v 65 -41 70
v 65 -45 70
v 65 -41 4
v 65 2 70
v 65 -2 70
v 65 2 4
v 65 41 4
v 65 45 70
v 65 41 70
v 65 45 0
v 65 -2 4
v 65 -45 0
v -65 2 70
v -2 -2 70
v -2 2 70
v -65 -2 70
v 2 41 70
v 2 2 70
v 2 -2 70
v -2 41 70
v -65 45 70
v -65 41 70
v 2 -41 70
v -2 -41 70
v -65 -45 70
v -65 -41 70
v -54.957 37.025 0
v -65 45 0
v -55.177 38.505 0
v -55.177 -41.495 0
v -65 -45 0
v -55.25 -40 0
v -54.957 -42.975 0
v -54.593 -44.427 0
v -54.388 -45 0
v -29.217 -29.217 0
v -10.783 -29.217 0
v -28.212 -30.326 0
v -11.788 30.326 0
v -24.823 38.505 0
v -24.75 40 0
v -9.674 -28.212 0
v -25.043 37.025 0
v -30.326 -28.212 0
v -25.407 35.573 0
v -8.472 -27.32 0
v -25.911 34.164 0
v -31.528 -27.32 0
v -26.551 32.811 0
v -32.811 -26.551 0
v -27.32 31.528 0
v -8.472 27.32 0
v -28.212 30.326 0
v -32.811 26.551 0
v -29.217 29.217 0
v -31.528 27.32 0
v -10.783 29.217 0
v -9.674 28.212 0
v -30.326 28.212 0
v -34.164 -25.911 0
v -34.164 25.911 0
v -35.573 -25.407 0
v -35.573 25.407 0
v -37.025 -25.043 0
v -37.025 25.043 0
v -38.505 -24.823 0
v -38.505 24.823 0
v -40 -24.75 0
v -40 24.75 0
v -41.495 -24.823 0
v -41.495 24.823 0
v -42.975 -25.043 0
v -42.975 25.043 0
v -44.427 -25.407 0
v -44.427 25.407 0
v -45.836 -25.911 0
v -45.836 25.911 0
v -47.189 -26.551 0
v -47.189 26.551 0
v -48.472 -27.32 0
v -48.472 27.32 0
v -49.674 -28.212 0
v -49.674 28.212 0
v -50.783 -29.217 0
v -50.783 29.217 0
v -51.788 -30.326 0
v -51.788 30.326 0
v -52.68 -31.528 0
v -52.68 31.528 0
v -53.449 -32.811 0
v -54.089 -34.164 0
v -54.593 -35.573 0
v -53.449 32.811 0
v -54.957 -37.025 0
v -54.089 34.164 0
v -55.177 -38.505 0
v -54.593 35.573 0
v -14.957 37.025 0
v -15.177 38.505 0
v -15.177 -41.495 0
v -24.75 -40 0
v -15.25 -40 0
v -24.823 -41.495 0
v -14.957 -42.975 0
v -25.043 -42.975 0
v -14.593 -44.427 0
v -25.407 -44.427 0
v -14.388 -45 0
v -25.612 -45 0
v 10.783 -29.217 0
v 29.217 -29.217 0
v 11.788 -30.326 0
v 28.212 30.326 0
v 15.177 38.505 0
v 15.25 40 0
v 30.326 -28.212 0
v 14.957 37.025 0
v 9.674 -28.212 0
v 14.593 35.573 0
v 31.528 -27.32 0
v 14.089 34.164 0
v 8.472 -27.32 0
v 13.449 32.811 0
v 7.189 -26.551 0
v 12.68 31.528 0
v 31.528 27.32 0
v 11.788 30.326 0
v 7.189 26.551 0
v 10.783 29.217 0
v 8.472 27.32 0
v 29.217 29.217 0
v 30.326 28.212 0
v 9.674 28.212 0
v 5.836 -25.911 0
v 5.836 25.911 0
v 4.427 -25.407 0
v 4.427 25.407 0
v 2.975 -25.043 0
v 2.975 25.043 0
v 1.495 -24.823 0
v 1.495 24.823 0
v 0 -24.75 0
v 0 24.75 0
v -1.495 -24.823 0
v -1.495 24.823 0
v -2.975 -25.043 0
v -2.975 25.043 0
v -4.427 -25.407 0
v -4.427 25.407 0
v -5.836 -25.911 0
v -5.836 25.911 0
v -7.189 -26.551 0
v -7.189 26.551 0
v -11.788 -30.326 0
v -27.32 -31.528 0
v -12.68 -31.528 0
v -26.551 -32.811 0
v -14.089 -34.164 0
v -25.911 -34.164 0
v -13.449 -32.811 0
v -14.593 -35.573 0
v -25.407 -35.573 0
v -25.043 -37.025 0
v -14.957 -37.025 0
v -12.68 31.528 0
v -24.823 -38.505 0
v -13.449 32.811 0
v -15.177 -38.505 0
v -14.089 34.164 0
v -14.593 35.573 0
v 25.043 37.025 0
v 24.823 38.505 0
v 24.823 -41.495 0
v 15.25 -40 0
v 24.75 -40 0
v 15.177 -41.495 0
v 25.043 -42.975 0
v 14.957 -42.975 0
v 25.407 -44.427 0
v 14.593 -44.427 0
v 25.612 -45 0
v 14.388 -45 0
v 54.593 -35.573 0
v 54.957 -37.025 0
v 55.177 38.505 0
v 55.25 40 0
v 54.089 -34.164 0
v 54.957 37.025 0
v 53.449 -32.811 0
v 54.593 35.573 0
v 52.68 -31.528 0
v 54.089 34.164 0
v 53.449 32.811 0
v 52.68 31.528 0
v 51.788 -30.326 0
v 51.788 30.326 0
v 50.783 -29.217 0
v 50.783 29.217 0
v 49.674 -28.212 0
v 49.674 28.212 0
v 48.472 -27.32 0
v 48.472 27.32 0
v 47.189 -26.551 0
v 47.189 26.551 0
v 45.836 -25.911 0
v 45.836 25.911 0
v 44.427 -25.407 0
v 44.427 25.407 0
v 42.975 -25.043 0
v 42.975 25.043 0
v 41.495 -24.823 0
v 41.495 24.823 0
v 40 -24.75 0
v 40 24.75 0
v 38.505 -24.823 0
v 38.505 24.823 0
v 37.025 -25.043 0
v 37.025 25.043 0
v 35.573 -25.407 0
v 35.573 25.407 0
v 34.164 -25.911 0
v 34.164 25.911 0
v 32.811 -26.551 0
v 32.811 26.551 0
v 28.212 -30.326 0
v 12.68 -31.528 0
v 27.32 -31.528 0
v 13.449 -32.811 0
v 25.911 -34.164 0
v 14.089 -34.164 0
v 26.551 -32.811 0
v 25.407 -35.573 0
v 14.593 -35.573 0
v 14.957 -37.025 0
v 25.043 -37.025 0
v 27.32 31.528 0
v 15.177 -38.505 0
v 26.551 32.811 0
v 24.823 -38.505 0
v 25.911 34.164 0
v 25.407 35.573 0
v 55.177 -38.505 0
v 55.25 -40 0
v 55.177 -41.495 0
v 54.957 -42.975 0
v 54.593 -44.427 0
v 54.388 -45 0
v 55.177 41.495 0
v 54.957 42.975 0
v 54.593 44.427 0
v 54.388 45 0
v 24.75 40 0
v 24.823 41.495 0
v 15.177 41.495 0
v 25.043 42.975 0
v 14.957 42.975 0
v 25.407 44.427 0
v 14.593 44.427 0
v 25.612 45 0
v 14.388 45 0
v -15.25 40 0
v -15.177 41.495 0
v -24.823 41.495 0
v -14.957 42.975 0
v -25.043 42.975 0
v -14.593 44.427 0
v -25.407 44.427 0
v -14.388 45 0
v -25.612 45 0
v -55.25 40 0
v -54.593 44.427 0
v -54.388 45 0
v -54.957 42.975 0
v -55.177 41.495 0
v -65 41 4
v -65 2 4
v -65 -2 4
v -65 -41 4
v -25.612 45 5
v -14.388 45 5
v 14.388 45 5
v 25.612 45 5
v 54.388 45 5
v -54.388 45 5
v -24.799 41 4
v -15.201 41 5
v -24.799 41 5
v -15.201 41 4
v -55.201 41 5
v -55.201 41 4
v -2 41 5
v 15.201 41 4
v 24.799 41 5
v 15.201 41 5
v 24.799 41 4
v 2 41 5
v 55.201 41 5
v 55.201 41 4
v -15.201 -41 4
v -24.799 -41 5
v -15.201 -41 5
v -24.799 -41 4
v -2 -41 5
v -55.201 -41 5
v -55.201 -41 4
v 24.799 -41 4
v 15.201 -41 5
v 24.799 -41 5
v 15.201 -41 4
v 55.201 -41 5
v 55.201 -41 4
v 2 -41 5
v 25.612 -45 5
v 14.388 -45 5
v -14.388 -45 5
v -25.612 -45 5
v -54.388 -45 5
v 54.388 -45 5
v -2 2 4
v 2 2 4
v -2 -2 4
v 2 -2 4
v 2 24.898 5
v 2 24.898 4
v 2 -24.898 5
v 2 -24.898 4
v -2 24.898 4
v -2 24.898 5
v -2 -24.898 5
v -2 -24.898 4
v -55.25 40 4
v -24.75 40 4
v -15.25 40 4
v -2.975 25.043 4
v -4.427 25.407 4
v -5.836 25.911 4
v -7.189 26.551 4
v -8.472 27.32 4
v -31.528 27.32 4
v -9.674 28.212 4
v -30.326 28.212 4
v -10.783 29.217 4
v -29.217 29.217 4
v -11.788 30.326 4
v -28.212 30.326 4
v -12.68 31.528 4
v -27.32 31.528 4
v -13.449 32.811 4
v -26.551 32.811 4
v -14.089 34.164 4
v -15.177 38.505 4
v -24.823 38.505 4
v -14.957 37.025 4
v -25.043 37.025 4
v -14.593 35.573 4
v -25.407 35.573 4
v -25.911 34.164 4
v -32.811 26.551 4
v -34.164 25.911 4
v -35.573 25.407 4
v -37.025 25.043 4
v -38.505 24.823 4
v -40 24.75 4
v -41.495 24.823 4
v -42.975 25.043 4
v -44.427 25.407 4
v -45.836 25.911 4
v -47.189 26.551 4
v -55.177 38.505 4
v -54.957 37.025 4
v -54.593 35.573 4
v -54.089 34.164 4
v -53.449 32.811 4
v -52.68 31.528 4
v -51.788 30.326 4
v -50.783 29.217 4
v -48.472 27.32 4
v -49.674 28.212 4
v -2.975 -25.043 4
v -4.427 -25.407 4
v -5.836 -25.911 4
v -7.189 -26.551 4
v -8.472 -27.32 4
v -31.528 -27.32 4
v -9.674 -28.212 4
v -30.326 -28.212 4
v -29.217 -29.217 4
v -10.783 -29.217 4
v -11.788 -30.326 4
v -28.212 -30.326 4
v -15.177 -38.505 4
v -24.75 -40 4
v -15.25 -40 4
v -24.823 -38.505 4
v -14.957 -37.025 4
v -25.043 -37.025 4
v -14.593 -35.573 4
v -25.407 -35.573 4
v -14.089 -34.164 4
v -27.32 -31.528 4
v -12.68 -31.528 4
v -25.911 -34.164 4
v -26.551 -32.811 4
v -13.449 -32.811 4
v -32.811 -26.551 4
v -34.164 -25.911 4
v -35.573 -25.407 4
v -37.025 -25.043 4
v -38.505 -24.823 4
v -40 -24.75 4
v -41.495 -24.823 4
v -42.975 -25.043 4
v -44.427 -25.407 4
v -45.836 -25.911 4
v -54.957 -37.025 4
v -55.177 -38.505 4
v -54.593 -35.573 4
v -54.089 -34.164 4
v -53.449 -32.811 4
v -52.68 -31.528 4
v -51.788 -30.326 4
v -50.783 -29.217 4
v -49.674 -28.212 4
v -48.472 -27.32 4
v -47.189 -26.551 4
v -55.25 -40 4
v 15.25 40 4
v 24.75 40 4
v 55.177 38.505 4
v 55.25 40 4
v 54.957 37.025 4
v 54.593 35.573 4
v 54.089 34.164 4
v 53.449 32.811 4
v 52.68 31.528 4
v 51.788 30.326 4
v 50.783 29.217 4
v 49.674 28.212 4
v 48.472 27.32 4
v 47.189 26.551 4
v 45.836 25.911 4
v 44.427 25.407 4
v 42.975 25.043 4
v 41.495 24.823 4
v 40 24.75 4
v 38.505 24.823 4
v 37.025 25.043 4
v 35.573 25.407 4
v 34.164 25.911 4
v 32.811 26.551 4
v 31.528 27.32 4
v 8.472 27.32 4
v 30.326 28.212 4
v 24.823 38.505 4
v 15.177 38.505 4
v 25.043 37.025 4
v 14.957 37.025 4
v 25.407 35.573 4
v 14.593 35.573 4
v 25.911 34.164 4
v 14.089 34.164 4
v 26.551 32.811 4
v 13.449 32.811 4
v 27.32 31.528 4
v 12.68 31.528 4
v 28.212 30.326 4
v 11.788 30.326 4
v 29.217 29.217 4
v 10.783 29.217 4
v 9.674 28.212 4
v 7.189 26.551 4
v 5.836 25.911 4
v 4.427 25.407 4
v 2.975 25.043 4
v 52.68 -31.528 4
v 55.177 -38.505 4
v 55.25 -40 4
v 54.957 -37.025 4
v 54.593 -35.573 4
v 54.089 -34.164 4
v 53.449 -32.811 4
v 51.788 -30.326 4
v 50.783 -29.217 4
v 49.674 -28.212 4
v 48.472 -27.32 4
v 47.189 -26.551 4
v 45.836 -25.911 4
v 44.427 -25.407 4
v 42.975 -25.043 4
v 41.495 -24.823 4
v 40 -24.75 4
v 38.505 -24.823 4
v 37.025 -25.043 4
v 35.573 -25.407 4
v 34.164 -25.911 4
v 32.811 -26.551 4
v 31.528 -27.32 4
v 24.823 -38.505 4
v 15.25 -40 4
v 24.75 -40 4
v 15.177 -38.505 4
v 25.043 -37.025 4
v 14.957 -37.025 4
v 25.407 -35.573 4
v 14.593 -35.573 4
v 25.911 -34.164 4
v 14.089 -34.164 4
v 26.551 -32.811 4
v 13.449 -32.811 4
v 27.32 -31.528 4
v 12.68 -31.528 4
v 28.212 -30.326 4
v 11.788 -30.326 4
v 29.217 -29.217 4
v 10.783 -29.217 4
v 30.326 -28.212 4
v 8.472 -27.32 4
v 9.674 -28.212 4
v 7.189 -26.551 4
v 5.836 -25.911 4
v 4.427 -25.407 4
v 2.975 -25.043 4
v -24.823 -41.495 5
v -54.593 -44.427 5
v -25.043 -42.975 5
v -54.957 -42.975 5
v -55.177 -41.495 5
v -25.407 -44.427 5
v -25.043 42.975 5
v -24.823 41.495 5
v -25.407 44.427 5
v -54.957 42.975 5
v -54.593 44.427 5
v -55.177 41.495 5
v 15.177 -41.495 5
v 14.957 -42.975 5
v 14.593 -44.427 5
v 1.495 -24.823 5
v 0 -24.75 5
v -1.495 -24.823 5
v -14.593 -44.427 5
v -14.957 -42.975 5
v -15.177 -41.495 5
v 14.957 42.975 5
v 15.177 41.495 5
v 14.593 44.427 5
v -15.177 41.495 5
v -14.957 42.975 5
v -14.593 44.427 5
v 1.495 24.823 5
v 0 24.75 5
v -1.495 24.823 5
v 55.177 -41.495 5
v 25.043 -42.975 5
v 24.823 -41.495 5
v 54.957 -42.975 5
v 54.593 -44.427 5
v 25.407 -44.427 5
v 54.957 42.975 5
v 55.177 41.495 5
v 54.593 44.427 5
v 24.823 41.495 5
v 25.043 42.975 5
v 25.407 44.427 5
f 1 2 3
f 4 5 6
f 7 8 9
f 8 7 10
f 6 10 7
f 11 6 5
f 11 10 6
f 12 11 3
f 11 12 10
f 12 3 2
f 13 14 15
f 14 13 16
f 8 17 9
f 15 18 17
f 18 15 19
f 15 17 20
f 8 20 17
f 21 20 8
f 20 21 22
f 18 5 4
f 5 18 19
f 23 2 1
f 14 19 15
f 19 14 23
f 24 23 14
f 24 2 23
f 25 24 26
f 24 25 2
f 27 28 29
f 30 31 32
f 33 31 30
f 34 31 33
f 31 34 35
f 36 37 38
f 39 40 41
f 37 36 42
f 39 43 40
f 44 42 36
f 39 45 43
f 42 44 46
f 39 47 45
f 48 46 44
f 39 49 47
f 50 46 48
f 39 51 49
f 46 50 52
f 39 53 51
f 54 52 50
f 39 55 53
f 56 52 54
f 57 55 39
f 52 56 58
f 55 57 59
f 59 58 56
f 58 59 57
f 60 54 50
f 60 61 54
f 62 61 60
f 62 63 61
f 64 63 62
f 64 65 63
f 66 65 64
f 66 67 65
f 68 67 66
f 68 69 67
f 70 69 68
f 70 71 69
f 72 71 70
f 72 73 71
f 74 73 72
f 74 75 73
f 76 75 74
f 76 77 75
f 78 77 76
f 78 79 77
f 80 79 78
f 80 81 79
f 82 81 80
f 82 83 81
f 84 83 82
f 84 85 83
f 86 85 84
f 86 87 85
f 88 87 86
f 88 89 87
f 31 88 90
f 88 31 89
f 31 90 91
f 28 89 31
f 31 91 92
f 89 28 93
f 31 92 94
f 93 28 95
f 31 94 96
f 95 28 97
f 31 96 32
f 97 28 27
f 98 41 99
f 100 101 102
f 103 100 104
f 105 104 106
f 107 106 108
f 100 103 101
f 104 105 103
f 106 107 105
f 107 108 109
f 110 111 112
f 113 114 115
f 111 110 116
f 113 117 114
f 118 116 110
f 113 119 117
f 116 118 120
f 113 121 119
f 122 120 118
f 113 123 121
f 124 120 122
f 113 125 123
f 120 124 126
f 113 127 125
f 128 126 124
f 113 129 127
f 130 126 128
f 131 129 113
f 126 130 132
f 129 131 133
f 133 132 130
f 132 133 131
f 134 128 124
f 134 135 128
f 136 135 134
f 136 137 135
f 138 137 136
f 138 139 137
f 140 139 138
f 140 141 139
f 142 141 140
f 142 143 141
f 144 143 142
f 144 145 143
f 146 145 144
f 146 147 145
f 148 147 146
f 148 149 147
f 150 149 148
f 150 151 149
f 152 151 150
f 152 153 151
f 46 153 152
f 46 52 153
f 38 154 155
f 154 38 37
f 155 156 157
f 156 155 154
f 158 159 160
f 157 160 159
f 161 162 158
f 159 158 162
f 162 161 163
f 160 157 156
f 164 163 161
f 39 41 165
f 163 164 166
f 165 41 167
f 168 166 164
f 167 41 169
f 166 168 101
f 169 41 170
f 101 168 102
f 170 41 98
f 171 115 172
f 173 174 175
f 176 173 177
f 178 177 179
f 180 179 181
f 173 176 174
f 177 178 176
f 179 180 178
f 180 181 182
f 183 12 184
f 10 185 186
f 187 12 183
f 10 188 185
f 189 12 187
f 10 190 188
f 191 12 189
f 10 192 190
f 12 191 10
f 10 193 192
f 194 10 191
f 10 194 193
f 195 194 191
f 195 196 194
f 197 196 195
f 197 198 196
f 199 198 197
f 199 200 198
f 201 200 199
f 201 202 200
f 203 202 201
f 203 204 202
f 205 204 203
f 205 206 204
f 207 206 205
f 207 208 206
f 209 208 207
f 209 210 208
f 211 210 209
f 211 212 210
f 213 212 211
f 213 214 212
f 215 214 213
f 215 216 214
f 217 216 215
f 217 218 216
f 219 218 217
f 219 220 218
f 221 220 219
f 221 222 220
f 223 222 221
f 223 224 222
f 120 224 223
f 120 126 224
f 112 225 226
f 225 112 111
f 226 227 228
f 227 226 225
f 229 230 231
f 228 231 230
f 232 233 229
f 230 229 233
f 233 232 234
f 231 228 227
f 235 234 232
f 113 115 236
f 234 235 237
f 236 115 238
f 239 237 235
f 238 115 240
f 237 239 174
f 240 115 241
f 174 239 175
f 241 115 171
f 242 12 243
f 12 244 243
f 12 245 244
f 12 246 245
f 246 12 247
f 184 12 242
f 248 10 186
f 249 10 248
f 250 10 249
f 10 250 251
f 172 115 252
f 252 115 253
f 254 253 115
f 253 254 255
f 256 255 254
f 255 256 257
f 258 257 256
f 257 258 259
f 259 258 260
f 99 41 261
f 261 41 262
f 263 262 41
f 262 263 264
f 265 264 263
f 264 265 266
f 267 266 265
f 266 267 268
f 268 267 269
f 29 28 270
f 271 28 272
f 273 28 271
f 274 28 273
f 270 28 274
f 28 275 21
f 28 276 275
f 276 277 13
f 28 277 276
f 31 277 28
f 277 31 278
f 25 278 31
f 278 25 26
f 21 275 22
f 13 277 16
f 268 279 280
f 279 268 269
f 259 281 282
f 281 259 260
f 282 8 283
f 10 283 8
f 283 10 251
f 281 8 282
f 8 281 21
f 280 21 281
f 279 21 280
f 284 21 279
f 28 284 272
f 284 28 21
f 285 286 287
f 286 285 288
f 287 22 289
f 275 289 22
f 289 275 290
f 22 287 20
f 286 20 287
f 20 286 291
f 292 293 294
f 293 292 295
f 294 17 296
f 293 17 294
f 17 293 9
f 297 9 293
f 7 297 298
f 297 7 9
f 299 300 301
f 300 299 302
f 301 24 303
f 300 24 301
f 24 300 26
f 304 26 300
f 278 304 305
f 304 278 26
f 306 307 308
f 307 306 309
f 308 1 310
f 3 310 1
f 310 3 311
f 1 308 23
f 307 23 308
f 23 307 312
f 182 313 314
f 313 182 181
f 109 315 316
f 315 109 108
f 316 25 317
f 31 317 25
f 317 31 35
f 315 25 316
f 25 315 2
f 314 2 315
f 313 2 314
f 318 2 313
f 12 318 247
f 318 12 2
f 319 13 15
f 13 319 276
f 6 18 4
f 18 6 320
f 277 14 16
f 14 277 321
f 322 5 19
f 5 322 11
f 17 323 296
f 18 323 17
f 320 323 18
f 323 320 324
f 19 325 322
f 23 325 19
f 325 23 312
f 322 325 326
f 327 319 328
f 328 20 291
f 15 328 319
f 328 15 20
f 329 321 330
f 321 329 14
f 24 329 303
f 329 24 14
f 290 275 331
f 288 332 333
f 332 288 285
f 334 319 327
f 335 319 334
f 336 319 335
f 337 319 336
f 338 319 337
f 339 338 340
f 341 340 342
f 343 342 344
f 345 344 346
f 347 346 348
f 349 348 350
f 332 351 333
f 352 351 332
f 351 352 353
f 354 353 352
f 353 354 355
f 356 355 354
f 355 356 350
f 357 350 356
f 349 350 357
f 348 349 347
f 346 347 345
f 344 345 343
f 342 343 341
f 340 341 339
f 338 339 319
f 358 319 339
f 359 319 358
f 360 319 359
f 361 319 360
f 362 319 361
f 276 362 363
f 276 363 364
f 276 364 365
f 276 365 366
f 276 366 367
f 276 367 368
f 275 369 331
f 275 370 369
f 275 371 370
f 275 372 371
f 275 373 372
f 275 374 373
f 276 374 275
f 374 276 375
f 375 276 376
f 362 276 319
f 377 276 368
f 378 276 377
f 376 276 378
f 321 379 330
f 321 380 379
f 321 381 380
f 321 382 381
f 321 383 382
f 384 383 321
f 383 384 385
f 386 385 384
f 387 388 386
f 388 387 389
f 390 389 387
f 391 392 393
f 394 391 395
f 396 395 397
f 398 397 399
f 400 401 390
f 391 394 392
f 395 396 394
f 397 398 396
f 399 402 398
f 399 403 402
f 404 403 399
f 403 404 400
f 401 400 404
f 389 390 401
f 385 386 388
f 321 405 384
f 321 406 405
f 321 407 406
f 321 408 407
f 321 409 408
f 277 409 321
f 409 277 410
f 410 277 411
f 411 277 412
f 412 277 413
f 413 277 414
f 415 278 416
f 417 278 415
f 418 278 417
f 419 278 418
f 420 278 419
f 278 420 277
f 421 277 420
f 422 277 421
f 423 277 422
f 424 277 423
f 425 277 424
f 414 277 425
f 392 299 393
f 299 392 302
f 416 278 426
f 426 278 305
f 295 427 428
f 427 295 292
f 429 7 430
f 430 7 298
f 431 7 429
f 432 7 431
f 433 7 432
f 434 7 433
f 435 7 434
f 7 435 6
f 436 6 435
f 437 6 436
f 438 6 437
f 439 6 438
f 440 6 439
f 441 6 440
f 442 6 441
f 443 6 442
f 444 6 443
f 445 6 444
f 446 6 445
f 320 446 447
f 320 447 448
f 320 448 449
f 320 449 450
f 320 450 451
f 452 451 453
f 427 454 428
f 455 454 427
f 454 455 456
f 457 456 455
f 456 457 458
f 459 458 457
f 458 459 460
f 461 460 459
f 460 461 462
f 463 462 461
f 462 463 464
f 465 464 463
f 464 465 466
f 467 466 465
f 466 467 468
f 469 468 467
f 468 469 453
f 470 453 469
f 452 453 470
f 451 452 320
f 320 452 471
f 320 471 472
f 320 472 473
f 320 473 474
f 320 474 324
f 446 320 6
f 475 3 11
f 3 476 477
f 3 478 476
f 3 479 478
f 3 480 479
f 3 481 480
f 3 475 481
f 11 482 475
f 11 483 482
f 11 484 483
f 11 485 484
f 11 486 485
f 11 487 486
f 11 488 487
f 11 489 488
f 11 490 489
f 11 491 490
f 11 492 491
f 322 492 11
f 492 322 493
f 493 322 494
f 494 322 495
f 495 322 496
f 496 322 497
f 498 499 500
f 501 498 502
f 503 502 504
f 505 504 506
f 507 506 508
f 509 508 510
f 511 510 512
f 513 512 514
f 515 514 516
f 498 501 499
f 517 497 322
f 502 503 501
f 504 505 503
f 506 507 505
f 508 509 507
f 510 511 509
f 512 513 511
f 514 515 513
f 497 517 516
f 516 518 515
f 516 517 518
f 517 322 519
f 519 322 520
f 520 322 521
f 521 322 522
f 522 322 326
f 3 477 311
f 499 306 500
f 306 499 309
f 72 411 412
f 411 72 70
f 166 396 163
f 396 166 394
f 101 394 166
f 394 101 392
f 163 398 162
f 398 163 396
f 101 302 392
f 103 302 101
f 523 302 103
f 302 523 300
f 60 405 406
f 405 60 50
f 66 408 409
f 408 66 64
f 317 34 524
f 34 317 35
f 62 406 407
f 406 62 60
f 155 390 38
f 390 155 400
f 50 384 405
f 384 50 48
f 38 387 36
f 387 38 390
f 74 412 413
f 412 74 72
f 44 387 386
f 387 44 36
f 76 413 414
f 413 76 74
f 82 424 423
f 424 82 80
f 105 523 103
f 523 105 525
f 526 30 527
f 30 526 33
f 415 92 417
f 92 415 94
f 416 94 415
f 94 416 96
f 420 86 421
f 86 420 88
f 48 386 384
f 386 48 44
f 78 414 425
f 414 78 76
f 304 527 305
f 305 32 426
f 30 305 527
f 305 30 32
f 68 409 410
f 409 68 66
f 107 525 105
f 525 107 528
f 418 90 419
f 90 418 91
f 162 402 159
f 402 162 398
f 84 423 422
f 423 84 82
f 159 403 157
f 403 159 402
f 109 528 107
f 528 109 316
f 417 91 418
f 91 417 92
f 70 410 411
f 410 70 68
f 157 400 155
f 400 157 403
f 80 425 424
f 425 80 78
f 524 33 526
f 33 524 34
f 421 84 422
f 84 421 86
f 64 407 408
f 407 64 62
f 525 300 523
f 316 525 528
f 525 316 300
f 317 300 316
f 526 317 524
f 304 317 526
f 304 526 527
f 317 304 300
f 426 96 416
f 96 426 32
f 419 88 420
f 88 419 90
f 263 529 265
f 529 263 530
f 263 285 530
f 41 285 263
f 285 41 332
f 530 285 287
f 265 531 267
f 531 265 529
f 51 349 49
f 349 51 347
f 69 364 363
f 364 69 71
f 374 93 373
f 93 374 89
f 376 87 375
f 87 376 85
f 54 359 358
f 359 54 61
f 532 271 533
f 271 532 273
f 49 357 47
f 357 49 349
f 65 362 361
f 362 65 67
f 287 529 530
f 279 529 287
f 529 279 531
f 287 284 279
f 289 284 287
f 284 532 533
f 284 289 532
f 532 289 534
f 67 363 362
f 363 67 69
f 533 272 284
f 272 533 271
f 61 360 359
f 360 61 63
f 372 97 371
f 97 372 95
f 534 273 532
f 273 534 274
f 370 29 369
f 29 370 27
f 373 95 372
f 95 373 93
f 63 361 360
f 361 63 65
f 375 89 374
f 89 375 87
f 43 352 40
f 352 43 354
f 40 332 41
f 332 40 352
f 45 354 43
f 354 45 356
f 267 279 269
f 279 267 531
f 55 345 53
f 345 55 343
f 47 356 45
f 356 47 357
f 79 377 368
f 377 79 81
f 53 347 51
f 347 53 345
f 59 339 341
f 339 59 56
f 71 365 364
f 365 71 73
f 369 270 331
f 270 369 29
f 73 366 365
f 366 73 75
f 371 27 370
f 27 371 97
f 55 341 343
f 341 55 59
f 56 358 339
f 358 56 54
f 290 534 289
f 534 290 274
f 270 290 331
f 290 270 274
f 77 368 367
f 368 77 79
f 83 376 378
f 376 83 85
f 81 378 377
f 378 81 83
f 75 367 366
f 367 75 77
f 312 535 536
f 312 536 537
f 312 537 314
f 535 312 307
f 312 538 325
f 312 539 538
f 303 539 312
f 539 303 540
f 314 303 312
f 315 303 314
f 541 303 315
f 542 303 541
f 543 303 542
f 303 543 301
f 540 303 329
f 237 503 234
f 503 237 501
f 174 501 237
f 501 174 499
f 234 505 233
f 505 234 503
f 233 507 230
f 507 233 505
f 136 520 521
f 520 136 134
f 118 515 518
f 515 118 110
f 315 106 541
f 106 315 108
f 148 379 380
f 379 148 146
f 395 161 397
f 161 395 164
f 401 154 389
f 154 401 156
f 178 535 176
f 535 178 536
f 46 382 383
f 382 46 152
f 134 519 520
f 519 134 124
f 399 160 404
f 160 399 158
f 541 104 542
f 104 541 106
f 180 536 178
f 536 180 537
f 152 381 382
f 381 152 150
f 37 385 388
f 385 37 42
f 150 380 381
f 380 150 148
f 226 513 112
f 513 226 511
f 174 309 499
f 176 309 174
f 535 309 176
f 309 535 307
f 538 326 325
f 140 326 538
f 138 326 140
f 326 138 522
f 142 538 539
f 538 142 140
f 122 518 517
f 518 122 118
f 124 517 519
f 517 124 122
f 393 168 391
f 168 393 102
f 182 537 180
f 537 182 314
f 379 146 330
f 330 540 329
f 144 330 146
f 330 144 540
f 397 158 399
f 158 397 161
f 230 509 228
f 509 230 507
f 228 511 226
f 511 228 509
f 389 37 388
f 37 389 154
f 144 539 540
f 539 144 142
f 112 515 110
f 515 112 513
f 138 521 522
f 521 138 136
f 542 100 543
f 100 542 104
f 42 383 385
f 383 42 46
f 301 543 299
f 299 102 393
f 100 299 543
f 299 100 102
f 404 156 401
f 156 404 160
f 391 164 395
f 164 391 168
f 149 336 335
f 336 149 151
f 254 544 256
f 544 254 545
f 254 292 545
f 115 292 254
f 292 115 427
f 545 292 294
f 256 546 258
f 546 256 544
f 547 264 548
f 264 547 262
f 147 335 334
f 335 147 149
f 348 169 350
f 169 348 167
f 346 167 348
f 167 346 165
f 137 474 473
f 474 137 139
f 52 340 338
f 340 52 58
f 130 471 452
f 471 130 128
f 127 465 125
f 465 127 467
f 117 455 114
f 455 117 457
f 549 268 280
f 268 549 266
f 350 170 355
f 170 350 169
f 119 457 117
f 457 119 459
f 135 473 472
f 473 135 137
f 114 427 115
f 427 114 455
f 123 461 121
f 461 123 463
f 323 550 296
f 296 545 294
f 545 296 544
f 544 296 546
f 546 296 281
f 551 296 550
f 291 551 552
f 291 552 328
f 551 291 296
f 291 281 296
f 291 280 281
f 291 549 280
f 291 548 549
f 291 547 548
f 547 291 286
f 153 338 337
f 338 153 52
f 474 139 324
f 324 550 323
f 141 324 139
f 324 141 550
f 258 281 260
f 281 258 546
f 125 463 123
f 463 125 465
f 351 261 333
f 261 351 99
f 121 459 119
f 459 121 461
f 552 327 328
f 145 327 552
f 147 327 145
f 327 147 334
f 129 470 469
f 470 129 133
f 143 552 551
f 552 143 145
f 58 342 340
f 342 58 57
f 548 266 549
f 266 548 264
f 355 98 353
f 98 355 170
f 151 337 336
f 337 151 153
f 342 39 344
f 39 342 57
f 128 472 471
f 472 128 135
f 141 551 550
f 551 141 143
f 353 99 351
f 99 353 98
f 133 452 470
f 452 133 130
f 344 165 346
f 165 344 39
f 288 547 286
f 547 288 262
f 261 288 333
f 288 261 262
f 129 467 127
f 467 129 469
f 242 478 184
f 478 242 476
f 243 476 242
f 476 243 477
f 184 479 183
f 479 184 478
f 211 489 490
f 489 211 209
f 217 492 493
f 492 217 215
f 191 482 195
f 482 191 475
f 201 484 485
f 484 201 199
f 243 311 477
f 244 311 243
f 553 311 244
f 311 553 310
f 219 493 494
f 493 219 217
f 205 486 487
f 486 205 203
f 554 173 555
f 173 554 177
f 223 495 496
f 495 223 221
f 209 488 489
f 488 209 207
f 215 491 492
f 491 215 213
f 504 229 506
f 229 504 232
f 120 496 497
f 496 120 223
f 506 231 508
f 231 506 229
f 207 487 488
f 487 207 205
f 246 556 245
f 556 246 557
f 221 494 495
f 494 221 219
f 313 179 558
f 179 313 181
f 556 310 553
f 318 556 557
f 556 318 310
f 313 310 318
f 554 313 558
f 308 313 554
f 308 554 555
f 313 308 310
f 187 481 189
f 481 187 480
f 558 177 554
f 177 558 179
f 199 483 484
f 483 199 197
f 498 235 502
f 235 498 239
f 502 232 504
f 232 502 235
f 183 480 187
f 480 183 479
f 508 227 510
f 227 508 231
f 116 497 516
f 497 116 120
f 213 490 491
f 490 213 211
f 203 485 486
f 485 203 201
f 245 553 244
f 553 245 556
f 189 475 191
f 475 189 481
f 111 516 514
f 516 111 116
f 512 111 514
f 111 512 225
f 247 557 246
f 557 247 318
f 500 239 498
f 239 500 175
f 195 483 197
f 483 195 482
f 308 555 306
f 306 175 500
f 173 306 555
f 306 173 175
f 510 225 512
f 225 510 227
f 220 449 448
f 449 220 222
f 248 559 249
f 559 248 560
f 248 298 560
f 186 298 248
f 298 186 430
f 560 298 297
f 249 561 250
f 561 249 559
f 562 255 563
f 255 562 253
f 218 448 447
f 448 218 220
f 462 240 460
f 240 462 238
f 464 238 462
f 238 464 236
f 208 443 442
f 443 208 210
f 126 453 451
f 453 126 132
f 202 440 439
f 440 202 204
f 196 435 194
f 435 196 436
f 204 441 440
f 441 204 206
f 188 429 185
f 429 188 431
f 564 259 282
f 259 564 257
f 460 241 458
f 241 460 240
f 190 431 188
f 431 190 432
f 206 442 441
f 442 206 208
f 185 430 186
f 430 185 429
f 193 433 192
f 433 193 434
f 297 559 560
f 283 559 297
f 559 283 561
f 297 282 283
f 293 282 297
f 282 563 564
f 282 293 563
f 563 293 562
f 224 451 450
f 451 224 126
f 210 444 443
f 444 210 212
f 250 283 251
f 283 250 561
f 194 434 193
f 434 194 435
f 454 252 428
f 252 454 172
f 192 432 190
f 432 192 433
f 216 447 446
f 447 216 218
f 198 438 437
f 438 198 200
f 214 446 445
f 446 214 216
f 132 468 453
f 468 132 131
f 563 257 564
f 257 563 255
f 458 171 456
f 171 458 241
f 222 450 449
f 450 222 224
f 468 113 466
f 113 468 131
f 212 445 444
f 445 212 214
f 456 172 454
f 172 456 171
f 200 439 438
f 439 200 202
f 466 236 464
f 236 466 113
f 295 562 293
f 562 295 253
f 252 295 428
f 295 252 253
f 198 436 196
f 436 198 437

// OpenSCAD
// 50 mL conical tube rack – printed upside-down, then flipped.
// Print orientation: flat plate on the bed (z = 0..4), walls rising +Z.
// After flipping: rack stands on the two walls; tubes pass through the holes.

// ---- Plate ----
plate_x = 130;   // plate length along X (mm)
plate_y = 90;    // plate width  along Y (mm)
plate_t = 4;     // plate thickness (mm)

// ---- Tube holes ----
hole_d  = 30.5;  // through-hole diameter (mm)
hole_r  = hole_d / 2;
pitch   = 40;    // centre-to-centre spacing in both X and Y (mm)

// ---- Side walls (run along the two long edges, i.e. along X) ----
wall_len  = 130; // wall length along X (mm)
wall_thk  = 4;   // wall thickness along Y (mm)
wall_h    = 70;  // wall height above z = 0 (mm)

// ---- Internal cross-brace (spans the gap between the two walls so the
//      plate top is a flat, supported surface and needs no bridging) ----
brace_thk = 4;   // brace thickness (mm)

$fn = 64;

// ------------------------------------------------------------------
// Base plate, centred on the origin in X and Y, sitting on z = 0.
// ------------------------------------------------------------------
module plate() { translate([-plate_x/2, -plate_y/2, 0])
        cube([plate_x, plate_y, plate_t]); }

// ------------------------------------------------------------------
// Six through-holes: 2 rows (Y) x 3 columns (X), 40 mm pitch, centred.
// Cylinders extend 1 mm past each face of the 4 mm plate (z = -1..5)
// so no cut face is exactly coplanar with the plate faces.
// ------------------------------------------------------------------
module holes() { for (i = [-1, 0, 1], j = [-1, 1])
    translate([i * pitch, j * pitch, -1])
        cylinder(h = plate_t + 2, r = hole_r, $fn = $fn); }

// ------------------------------------------------------------------
// Two solid walls along the long edges, flush with the plate edges.
// Each wall: 130 (X) x 4 (Y) x 70 (Z), rising from z = 0 to z = 70.
// ------------------------------------------------------------------
module walls() { union()
    // wall on the +Y edge (flush with y = +plate_y/2)
    translate([-wall_len/2,  plate_y/2 - wall_thk, 0])
        cube([wall_len, wall_thk, wall_h]);
    // wall on the -Y edge (flush with y = -plate_y/2)
    translate([-wall_len/2, -plate_y/2, 0])
        cube([wall_len, wall_thk, wall_h]); }

// ------------------------------------------------------------------
// Internal cross-brace: a 4 mm-thick strip along X at the centre, plus
// a 4 mm-thick strip along Y, both rising from the plate to z = 70.
// The X strip spans the 82 mm gap between the walls, so the plate top
// is a flat, supported surface (no bridging / no supports needed).
// The Y strip is centred on the plate and clears the tube holes.
// ------------------------------------------------------------------
module brace() { union()
    translate([-wall_len/2, -brace_thk/2, 0])
        cube([wall_len, brace_thk, wall_h]);
    translate([-brace_thk/2, -plate_y/2, 0])
        cube([brace_thk, plate_y, wall_h]); }

// ------------------------------------------------------------------
// Final part: plate + walls + brace, with the six through-holes cut.
// ------------------------------------------------------------------
difference() {
    union() {
        plate();
        walls();
        brace();
    }
    holes();
}
